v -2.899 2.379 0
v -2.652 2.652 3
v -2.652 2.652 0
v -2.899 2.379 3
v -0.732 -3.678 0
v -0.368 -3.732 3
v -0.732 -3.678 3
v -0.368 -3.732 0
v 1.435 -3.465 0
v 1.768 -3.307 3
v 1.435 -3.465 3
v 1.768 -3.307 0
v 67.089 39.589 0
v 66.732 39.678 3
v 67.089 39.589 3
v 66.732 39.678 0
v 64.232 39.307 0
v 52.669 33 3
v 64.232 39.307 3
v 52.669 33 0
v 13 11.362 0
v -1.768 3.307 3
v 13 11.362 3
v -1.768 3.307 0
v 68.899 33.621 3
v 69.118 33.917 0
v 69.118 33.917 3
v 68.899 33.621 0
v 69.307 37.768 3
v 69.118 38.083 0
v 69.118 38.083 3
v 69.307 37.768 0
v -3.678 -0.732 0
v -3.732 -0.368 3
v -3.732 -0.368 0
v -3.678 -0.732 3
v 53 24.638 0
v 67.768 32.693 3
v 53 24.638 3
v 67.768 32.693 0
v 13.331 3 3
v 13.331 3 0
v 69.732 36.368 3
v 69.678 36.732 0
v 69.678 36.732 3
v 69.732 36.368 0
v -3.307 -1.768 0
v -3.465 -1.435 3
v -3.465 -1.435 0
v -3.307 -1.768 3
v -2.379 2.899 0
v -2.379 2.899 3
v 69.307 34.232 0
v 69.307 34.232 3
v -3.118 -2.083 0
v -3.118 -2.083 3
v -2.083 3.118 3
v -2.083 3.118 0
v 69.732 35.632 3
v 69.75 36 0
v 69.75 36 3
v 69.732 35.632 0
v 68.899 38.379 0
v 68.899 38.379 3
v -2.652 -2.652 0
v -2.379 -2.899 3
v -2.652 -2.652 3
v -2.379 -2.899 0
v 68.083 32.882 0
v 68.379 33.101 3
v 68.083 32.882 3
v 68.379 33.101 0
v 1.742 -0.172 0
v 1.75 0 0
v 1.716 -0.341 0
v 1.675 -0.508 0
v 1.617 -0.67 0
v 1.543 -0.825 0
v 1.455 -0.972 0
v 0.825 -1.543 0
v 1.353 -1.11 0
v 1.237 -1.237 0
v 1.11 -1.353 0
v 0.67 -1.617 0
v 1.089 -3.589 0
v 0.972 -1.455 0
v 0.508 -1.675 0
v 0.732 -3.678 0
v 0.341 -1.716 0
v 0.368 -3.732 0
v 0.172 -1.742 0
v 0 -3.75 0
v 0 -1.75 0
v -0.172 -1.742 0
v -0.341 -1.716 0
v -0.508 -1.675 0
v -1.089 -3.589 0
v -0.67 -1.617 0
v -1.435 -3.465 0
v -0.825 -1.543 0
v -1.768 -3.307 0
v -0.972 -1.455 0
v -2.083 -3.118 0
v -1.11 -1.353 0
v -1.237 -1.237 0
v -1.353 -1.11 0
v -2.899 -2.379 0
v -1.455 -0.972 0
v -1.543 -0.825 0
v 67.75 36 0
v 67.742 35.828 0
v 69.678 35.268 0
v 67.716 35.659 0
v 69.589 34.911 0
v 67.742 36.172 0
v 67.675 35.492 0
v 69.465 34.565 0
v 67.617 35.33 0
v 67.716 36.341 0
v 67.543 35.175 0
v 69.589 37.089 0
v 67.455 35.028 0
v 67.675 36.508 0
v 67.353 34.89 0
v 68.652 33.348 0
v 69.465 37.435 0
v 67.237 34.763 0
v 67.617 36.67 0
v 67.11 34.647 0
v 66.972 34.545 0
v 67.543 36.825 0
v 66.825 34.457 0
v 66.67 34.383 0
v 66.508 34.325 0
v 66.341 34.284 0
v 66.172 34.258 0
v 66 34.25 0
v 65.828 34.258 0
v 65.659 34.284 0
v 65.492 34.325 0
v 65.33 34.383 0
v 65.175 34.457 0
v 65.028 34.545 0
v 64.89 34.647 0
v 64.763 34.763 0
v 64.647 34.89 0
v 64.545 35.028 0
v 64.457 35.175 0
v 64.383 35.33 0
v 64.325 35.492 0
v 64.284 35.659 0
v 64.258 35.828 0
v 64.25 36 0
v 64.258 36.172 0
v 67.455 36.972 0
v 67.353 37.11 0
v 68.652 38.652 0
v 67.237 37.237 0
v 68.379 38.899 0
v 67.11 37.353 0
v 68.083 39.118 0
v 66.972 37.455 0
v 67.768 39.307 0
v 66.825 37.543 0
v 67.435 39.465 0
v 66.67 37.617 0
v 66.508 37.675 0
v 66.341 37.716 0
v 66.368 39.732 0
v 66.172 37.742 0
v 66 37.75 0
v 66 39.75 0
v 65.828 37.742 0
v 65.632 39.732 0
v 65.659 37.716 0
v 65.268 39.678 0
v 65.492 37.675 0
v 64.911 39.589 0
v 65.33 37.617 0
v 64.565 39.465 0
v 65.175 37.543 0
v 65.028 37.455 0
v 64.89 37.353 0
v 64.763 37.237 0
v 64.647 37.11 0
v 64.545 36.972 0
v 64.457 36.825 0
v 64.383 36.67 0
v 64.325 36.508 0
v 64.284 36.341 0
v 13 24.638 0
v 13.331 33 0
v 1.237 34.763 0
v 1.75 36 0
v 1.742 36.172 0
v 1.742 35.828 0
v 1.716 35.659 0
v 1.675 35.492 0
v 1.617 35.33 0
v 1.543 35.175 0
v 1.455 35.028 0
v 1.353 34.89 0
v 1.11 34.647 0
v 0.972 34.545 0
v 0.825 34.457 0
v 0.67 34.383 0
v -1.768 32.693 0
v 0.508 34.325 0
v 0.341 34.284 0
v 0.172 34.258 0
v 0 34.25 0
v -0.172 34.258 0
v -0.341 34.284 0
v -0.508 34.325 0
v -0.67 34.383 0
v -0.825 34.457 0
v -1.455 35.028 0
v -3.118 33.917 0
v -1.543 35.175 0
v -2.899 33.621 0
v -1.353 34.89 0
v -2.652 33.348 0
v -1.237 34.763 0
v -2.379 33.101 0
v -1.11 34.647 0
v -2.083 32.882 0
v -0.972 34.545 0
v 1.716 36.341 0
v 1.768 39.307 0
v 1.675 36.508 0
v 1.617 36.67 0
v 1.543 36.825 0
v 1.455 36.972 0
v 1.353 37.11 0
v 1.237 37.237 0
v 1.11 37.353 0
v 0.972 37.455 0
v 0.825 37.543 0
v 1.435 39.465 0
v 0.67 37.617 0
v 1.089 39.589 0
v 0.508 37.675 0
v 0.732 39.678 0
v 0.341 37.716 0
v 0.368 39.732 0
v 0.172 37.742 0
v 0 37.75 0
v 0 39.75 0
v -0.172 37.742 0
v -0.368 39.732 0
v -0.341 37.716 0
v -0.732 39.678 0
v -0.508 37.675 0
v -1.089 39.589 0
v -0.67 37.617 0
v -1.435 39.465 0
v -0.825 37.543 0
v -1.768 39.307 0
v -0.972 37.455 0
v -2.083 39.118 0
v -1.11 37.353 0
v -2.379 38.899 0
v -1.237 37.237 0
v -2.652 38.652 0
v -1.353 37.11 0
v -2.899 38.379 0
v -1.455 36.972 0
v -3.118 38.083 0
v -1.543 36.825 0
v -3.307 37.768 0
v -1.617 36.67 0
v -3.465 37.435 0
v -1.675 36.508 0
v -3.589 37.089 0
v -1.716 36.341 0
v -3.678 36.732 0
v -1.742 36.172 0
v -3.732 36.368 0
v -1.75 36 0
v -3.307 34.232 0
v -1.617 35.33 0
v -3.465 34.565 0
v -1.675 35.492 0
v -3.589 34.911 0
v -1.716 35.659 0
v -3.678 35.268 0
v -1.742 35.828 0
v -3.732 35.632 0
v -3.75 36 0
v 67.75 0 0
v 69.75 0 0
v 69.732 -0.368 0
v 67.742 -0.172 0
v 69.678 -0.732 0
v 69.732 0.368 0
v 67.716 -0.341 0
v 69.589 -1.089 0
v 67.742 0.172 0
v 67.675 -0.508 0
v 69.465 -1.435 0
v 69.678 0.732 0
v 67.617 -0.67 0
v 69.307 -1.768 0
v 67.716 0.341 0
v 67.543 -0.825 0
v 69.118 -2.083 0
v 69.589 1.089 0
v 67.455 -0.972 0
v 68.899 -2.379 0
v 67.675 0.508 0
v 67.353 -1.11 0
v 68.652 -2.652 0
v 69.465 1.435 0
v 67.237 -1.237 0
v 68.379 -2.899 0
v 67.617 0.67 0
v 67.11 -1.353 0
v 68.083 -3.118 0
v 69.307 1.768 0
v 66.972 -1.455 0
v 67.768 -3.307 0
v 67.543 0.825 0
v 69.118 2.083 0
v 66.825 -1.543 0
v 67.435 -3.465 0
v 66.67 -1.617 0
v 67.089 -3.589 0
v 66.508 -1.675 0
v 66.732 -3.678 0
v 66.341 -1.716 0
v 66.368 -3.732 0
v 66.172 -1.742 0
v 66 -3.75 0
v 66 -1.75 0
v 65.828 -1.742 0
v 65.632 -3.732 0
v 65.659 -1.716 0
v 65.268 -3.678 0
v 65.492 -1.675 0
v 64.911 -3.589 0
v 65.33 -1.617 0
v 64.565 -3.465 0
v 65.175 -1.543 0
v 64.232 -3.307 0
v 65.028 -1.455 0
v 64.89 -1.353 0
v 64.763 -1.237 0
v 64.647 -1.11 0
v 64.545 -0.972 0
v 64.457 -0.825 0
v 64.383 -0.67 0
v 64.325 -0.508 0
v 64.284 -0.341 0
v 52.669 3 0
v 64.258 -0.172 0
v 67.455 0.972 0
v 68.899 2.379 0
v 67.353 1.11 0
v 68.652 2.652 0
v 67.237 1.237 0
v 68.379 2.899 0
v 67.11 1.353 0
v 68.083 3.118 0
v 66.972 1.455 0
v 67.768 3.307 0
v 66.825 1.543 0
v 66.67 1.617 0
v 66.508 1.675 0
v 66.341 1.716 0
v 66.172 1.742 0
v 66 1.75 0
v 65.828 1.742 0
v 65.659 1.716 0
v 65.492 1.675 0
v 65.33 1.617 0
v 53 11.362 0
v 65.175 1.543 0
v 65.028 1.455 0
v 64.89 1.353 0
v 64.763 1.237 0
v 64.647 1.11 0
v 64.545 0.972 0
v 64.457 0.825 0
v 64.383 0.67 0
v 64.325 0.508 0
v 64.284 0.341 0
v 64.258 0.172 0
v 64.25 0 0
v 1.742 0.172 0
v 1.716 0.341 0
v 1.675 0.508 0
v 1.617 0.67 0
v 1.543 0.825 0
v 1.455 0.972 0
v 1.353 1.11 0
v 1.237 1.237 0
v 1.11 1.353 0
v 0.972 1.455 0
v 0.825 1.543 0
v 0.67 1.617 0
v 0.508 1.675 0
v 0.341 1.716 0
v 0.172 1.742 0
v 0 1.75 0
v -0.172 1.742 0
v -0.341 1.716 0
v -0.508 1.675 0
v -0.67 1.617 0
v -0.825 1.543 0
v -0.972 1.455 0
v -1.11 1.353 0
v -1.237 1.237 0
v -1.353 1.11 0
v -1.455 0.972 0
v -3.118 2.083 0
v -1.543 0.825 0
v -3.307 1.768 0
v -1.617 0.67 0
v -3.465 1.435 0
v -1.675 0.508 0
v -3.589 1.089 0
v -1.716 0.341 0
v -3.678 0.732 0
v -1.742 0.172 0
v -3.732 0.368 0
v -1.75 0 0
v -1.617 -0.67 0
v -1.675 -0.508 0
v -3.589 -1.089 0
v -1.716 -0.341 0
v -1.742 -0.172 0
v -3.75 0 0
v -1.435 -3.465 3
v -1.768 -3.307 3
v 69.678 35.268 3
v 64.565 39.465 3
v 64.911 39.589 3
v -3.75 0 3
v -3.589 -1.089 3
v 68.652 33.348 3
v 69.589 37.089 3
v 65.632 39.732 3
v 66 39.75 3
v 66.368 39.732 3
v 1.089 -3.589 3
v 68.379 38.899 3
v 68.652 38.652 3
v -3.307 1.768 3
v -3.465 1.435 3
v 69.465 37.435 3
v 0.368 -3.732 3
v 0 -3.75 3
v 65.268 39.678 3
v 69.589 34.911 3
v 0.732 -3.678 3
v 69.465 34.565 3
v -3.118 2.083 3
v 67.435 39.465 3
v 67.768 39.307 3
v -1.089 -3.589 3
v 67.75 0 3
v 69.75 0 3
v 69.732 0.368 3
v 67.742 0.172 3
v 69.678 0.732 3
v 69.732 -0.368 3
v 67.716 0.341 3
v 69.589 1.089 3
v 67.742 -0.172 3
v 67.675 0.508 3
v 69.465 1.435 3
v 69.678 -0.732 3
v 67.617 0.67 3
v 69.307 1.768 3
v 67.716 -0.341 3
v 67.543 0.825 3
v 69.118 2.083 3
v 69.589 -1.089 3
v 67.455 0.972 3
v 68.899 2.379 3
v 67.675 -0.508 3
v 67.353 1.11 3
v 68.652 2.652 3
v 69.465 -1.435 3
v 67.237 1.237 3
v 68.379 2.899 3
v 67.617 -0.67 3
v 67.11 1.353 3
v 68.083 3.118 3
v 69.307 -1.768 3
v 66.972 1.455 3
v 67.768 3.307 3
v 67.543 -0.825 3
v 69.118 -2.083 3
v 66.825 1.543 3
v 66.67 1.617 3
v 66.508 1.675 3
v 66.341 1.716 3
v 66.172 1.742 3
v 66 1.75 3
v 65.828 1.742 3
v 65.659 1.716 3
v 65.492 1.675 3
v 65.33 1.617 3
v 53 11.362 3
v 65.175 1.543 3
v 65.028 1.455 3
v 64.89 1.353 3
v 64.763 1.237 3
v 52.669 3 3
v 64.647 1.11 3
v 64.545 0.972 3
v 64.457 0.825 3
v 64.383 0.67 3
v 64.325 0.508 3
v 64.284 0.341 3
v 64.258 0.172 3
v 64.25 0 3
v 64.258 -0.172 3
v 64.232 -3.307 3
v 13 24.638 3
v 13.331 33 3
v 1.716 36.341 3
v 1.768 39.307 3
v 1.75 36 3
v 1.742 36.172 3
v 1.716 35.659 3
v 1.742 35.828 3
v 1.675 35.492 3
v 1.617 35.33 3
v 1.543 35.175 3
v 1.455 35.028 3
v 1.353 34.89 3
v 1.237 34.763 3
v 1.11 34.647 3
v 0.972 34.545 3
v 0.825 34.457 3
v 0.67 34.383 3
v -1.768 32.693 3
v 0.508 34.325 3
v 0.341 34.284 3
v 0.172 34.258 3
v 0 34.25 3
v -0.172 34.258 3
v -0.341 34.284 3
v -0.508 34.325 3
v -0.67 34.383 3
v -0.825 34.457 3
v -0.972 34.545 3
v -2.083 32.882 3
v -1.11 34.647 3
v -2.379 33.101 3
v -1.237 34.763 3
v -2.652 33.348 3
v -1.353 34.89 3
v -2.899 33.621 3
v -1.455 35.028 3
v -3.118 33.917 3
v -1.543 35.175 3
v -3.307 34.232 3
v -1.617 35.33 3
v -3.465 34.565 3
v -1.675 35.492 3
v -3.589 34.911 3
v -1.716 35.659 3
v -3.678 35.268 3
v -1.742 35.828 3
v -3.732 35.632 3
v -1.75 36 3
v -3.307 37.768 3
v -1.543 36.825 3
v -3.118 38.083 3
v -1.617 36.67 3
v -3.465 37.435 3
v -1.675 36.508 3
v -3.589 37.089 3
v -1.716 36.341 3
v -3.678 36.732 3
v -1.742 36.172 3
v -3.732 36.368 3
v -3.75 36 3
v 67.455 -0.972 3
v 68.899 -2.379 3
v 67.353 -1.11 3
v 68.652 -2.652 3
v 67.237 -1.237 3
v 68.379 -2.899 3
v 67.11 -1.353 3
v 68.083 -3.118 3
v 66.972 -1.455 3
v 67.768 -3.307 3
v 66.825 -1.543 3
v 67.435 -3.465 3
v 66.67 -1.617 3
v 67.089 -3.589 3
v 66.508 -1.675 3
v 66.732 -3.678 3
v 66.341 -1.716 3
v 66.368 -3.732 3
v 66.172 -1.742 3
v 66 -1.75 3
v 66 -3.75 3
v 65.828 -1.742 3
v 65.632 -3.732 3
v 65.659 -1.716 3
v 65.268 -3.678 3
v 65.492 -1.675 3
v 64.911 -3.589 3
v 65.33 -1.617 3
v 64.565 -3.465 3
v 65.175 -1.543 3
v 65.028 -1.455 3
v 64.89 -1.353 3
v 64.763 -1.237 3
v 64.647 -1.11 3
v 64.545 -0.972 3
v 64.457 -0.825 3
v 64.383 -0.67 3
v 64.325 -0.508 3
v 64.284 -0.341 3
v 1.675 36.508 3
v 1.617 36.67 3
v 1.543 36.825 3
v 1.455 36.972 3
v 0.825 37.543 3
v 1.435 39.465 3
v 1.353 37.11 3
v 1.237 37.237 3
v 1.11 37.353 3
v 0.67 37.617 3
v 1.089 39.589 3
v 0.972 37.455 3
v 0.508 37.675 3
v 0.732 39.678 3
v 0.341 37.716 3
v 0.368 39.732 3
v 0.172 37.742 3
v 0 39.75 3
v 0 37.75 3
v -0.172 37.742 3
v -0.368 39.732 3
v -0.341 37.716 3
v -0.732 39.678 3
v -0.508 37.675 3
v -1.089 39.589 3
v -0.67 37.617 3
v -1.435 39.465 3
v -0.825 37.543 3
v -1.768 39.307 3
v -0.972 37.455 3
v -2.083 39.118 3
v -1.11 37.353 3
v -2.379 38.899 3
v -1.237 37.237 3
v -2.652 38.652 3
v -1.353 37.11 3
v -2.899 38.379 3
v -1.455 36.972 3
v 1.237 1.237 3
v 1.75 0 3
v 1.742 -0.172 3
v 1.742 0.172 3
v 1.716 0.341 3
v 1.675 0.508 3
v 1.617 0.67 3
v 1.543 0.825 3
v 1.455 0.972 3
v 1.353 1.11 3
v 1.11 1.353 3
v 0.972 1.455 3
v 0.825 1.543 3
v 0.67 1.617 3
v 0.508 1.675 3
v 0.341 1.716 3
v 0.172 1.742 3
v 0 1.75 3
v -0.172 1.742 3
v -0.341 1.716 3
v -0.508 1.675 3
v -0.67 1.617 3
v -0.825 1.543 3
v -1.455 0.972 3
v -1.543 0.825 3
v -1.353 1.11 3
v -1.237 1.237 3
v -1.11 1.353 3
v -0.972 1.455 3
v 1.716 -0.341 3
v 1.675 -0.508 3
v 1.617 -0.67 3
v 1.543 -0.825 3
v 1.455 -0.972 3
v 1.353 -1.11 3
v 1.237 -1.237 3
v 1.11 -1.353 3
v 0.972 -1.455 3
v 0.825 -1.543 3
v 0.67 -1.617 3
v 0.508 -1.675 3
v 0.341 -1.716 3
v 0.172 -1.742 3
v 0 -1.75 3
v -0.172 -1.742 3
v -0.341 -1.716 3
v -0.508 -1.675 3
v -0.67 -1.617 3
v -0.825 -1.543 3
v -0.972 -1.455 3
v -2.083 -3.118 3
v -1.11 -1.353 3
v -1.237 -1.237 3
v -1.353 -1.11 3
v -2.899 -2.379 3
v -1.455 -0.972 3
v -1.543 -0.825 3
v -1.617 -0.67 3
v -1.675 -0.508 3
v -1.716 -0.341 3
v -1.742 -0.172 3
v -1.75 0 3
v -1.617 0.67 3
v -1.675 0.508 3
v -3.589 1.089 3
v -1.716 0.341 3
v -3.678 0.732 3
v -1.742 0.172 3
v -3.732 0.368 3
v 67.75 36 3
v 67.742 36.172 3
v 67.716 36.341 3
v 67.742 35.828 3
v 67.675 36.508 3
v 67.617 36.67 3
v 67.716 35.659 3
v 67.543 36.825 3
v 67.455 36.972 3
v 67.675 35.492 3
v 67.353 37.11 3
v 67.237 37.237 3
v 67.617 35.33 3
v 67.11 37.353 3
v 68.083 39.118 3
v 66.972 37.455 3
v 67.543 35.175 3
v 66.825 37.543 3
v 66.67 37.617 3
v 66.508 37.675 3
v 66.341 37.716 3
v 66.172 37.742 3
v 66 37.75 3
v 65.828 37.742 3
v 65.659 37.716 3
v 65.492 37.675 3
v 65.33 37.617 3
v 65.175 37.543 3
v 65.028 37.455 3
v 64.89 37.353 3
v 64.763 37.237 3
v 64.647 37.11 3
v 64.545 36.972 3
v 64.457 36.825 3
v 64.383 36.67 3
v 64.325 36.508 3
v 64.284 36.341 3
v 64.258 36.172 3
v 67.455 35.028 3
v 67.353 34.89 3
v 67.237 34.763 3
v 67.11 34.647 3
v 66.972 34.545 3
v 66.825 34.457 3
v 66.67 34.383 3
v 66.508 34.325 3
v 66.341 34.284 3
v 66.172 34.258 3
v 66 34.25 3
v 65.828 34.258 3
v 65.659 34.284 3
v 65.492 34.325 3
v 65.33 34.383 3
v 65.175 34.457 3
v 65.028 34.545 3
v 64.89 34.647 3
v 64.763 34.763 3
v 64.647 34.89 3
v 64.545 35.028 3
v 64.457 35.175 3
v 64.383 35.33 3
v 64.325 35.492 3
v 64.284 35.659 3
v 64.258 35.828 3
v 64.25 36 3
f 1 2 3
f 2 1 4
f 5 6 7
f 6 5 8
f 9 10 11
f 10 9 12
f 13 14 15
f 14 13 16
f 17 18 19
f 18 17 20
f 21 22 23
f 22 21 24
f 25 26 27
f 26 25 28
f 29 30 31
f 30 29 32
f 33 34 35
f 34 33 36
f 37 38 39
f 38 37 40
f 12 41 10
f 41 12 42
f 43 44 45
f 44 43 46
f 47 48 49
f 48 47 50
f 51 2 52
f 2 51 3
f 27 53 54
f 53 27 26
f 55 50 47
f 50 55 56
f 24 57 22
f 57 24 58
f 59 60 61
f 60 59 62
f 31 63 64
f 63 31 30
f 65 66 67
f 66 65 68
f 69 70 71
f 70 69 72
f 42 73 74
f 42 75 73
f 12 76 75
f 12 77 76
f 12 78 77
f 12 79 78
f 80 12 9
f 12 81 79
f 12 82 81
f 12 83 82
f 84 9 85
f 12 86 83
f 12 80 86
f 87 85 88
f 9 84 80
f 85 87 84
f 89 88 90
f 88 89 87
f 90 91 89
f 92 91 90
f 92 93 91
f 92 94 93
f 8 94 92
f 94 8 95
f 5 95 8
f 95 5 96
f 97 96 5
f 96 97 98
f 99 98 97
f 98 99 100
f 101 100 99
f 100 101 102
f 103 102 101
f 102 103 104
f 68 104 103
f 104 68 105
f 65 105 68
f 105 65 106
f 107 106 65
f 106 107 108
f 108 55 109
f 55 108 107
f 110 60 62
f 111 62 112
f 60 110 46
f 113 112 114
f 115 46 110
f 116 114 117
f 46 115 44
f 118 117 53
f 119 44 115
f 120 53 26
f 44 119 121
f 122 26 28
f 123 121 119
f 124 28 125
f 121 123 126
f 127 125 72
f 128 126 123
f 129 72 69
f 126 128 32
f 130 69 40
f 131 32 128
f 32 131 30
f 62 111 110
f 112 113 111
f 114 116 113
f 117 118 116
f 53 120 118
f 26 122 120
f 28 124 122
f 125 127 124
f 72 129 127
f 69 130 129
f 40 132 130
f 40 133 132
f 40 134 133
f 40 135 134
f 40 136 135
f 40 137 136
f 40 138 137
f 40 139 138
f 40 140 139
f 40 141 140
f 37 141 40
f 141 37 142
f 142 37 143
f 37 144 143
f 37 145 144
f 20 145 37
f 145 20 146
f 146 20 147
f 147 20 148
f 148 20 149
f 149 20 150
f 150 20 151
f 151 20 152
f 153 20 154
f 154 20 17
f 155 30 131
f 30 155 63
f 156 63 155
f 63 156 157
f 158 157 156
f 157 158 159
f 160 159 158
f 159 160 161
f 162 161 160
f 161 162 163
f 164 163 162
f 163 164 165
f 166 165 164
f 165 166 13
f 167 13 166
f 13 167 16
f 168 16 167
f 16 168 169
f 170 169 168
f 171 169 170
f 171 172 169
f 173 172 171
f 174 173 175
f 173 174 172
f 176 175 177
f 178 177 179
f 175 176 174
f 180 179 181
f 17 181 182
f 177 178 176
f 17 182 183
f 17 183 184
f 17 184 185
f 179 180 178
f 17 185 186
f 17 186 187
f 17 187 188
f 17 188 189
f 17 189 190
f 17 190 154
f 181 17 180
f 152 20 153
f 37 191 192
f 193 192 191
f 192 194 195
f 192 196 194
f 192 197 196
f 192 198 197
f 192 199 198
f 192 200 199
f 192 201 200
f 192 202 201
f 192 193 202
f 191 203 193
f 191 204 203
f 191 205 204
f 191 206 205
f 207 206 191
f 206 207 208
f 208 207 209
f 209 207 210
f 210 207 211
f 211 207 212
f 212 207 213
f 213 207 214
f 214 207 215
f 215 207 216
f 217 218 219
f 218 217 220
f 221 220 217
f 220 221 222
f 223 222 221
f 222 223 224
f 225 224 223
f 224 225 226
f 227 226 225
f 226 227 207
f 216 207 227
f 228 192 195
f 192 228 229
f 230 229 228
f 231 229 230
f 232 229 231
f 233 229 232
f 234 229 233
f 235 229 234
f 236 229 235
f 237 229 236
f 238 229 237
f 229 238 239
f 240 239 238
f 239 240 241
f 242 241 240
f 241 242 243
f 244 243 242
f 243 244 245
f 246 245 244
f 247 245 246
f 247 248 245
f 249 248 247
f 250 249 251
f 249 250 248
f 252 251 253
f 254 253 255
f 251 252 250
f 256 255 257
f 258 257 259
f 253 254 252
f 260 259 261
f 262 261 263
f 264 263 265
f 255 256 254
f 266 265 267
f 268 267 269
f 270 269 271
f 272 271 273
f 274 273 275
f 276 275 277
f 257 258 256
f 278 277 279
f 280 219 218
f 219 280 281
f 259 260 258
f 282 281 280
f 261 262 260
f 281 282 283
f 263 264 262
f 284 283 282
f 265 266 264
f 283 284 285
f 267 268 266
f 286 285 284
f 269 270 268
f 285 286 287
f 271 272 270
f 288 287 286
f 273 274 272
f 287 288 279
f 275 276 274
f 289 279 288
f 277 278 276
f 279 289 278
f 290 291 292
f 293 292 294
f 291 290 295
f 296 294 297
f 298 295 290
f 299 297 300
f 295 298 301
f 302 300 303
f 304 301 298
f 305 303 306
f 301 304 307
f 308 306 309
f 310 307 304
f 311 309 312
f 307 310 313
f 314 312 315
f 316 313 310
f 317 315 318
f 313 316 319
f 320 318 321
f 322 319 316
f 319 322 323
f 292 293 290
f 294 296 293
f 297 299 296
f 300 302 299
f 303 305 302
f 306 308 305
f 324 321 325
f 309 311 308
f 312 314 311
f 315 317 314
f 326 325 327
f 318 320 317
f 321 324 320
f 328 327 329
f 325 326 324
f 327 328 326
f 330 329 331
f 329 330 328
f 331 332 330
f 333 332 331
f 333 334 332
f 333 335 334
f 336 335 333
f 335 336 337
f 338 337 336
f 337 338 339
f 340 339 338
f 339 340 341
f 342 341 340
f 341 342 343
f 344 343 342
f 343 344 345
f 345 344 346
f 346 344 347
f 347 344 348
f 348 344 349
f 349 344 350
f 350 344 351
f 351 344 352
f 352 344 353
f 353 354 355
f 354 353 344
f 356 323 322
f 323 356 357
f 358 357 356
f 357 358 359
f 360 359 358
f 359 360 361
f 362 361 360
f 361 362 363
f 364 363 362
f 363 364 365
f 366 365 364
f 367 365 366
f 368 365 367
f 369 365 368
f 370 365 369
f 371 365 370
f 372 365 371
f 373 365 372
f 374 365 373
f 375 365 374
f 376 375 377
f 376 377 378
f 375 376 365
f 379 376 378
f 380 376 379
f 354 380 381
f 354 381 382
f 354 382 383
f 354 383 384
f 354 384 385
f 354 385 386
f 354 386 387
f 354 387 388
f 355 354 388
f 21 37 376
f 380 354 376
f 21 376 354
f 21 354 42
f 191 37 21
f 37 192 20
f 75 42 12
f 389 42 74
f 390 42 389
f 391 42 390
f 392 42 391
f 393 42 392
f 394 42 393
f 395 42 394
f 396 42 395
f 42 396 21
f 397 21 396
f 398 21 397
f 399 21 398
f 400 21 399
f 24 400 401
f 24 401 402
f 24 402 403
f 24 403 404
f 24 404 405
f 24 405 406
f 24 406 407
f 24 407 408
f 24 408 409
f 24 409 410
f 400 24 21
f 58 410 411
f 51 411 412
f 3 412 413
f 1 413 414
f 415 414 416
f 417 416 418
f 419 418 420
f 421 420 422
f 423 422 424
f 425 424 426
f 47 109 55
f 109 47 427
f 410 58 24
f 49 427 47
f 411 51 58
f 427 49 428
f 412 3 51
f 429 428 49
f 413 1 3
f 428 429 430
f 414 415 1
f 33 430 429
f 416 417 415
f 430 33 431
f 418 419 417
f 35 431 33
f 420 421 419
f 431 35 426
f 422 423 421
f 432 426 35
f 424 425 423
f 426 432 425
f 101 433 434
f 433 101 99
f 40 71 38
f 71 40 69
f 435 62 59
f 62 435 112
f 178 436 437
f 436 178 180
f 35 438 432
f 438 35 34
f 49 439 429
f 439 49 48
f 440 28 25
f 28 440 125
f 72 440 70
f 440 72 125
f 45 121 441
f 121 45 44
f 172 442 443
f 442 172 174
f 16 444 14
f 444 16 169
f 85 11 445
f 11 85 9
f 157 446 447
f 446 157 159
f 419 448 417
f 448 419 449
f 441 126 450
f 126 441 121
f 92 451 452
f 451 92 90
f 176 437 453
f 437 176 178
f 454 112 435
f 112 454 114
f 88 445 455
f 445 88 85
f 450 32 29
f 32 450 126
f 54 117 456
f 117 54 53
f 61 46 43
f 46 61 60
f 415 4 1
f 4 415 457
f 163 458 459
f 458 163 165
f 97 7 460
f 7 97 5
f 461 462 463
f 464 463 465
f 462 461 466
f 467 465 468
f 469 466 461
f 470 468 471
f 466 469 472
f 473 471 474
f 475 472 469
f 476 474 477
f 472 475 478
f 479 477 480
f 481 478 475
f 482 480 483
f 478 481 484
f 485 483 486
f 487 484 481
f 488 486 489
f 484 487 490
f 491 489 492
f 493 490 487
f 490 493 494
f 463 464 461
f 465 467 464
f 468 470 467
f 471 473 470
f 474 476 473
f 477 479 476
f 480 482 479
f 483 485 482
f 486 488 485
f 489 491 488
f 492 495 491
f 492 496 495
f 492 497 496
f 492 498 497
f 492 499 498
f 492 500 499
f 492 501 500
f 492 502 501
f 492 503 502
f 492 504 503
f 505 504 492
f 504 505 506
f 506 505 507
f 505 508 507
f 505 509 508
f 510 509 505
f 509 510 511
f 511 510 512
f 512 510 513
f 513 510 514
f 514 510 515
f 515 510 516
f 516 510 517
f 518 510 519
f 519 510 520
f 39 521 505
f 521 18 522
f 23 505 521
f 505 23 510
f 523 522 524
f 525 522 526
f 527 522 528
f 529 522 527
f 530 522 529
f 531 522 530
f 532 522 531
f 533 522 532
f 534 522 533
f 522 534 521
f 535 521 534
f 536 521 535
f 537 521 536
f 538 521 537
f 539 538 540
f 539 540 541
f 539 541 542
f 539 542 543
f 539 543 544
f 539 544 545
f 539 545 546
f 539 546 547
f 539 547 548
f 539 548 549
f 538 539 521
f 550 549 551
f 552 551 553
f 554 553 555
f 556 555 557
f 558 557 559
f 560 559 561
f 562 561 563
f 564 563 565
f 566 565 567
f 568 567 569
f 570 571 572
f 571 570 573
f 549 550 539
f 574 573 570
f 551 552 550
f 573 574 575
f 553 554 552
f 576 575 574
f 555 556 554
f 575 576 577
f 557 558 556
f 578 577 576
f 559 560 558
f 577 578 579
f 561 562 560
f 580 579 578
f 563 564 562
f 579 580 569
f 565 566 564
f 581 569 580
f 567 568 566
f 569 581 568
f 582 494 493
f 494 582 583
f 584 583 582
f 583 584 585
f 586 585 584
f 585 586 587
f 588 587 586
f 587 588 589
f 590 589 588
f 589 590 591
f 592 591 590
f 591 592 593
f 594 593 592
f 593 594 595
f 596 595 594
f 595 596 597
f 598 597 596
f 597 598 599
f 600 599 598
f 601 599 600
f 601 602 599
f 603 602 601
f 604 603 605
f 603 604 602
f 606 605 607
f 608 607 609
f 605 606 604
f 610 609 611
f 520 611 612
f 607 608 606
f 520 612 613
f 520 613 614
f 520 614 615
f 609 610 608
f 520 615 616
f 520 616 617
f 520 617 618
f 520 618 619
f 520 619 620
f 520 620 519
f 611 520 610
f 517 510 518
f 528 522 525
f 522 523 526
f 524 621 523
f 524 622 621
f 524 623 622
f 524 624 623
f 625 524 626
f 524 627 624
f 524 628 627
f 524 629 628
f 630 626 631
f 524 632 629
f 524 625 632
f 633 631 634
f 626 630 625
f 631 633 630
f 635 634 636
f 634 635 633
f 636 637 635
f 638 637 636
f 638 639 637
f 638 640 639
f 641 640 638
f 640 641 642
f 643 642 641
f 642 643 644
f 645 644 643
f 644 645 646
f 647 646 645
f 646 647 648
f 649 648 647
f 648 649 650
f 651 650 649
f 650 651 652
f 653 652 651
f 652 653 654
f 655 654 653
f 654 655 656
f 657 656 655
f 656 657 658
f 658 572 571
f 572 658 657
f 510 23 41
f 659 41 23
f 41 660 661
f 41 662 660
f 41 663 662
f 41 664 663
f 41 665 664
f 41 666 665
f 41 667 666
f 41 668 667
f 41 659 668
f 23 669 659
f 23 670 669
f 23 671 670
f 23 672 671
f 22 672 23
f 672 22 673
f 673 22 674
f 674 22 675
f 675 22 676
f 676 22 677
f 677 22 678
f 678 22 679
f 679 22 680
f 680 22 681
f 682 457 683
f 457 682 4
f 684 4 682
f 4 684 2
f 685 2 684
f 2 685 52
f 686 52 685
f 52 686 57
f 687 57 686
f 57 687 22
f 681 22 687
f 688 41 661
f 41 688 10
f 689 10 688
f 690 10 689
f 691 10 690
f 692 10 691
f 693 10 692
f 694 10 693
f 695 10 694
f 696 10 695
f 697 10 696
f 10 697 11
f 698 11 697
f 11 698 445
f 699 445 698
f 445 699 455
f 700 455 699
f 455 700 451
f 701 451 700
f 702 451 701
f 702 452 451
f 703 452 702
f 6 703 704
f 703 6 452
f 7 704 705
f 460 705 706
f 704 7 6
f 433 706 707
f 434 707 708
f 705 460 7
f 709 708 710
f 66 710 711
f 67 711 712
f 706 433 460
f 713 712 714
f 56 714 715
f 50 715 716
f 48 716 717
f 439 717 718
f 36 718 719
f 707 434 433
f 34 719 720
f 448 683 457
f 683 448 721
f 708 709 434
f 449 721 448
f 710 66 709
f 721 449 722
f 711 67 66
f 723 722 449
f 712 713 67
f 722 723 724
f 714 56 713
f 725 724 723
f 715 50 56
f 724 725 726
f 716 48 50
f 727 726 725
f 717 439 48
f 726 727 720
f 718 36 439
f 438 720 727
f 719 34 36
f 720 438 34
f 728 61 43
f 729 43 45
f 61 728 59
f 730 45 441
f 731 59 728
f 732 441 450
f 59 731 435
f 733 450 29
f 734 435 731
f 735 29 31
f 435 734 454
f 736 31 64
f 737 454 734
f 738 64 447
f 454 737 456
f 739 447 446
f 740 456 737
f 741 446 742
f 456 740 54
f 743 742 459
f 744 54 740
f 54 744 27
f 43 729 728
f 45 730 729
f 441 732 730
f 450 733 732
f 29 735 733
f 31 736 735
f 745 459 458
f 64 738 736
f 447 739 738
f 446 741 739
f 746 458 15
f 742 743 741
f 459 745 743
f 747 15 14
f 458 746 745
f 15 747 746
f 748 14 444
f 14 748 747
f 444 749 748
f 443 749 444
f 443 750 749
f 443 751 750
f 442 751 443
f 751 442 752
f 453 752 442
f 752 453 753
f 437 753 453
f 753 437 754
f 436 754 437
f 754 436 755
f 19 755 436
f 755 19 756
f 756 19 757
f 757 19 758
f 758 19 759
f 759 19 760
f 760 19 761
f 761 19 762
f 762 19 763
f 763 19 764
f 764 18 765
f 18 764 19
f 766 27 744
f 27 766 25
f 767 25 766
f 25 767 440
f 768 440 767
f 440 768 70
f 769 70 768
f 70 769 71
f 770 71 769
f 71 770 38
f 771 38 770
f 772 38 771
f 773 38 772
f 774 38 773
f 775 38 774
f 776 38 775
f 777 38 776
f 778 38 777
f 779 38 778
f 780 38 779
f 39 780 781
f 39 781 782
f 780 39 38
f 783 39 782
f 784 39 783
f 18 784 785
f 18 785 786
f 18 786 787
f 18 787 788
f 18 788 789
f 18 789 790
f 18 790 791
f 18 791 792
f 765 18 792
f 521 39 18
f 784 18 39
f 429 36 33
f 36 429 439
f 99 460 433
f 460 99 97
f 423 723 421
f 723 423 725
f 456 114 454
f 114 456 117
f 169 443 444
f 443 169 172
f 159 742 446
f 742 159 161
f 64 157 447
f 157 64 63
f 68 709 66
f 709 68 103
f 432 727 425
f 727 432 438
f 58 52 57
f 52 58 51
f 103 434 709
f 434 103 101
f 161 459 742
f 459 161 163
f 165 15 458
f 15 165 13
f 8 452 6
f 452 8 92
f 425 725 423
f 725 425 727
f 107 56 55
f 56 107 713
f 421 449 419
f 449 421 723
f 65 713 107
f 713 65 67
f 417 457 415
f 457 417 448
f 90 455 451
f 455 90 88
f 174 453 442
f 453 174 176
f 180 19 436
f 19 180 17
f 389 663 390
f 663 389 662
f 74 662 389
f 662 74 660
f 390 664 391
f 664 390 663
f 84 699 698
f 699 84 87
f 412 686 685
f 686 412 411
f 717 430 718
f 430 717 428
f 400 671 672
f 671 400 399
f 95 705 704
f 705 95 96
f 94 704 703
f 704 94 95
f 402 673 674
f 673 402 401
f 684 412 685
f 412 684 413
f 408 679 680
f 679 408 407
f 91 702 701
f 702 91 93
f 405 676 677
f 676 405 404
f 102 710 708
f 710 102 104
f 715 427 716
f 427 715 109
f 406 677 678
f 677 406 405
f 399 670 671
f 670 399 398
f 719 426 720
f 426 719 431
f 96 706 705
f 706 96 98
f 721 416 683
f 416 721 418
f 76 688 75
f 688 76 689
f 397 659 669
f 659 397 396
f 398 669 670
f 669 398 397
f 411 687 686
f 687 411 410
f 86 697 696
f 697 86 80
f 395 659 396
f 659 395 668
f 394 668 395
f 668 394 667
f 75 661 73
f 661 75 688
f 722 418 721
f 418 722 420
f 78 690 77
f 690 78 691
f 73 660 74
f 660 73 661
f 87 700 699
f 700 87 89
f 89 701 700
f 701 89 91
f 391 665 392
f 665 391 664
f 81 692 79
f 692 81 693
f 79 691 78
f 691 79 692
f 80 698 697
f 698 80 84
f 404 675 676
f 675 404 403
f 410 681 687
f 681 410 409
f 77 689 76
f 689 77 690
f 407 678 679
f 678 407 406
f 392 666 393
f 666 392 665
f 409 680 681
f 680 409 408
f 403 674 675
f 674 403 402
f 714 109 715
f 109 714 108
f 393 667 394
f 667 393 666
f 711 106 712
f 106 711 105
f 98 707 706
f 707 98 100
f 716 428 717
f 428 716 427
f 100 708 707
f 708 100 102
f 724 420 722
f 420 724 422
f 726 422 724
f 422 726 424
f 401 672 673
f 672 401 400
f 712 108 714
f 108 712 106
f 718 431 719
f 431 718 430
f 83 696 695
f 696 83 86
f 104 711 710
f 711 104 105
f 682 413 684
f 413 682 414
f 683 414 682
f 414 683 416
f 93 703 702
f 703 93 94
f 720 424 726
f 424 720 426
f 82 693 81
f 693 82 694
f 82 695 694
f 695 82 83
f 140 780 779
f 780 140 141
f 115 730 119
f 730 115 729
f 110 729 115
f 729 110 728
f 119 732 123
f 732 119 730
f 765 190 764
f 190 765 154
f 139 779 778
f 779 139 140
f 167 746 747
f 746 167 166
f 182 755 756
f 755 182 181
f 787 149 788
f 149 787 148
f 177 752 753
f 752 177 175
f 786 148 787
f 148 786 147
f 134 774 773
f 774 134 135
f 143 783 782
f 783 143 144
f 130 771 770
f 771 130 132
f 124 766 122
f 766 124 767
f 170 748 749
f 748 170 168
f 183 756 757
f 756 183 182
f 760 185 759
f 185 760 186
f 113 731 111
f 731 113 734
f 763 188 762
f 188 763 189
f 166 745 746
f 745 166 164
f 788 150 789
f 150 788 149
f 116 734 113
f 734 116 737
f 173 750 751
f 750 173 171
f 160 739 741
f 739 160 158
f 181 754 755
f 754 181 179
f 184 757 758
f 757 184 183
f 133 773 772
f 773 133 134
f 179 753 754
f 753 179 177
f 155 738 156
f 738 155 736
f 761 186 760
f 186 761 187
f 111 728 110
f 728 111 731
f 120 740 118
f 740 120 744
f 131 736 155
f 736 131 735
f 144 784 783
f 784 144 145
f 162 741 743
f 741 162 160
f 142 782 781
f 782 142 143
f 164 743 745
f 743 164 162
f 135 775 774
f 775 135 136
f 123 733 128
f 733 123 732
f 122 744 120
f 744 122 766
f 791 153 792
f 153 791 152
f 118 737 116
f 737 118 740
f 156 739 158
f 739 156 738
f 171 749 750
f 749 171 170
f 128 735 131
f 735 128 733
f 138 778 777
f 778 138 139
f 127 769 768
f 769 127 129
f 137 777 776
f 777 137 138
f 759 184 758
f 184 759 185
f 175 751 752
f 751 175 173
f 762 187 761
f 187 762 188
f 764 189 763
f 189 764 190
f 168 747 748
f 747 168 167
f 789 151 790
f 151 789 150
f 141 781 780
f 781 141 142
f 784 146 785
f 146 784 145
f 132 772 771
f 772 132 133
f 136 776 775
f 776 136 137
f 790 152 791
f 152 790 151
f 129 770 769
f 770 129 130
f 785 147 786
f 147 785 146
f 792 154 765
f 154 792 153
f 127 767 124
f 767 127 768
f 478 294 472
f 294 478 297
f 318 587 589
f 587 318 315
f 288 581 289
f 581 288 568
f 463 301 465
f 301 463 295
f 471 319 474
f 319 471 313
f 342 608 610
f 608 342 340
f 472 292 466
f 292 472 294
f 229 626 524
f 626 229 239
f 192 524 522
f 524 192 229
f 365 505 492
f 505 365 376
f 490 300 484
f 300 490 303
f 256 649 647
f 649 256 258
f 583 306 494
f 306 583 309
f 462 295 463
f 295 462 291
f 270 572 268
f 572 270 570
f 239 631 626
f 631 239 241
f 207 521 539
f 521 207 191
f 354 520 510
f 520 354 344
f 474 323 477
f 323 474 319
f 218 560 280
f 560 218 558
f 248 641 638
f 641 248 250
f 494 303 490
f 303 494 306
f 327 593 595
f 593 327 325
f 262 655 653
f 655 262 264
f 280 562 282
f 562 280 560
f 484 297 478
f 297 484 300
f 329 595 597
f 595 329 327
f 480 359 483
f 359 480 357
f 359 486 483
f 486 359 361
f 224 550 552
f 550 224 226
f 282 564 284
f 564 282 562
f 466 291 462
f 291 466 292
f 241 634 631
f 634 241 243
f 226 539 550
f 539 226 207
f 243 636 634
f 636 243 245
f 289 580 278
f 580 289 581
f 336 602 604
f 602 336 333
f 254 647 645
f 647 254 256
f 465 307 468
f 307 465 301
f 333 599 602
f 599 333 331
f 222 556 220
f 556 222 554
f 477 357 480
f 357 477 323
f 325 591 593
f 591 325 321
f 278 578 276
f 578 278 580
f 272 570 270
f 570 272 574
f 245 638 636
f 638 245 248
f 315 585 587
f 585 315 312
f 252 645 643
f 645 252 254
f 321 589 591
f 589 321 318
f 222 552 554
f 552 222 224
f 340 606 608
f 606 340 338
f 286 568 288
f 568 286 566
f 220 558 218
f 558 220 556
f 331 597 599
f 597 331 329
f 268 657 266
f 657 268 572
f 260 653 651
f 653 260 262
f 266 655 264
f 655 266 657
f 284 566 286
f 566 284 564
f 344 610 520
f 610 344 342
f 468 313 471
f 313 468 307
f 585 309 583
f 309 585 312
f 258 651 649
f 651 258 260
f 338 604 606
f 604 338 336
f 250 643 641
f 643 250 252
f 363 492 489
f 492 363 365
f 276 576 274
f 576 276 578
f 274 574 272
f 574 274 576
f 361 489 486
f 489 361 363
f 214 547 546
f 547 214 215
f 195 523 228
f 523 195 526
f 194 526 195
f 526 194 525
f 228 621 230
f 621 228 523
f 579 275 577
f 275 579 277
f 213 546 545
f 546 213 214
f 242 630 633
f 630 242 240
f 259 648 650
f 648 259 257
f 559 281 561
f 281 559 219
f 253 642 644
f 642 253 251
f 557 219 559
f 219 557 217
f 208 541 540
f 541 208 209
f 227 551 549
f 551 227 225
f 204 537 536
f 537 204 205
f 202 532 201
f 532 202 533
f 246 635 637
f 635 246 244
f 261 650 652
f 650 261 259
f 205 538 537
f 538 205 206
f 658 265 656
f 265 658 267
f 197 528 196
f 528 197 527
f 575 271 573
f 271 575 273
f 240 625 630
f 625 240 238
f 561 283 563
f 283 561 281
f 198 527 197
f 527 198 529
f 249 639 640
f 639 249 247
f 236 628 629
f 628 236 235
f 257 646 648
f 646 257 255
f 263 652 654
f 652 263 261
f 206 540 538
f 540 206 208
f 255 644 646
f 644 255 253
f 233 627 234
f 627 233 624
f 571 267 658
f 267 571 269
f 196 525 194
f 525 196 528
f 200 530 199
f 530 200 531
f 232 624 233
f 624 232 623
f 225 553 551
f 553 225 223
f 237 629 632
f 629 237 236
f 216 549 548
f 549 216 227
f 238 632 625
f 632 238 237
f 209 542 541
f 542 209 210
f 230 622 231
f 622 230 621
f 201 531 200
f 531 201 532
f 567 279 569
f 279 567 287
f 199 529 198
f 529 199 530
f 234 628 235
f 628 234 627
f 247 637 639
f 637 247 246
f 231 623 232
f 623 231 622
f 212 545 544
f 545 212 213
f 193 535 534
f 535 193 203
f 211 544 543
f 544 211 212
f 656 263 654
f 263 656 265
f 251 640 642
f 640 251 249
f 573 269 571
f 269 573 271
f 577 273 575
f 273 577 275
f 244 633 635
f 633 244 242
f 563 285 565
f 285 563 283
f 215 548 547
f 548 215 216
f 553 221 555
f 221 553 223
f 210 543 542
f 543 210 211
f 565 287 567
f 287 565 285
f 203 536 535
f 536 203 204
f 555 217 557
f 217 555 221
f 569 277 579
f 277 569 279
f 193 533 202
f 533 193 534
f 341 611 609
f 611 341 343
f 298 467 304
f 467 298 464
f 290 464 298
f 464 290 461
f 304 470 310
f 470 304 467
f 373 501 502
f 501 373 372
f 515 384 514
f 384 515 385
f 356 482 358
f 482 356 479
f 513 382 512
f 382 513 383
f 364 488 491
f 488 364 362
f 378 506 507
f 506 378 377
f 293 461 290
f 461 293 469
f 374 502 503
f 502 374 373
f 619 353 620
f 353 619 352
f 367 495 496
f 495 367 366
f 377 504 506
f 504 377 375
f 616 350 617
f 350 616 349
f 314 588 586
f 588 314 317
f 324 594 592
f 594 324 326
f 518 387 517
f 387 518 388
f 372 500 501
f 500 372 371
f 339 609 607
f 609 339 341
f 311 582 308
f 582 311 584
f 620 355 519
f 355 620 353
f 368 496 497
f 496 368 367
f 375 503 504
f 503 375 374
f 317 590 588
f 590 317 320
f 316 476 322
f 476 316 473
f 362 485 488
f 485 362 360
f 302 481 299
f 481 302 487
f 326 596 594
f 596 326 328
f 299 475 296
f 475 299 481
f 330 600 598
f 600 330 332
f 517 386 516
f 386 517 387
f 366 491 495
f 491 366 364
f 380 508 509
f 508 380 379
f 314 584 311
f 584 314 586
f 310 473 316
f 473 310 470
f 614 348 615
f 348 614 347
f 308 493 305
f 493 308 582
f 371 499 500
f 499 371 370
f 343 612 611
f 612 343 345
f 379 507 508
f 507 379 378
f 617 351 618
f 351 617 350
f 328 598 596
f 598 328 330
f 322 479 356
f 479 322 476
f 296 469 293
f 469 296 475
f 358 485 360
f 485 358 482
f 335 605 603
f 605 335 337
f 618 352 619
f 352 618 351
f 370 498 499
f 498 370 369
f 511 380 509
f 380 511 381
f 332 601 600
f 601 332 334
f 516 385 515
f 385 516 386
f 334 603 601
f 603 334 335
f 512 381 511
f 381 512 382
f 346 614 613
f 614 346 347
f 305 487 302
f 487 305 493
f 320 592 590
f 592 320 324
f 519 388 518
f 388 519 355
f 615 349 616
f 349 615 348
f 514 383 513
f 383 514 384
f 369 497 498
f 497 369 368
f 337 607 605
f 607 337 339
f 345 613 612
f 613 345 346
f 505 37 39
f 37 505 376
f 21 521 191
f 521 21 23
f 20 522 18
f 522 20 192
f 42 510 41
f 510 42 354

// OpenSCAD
// file: subpieces/bone.scad
        

module bone(length, width, thickness, _fn) {
    hull() {
        cylinder(h = thickness, r = width, center = false, $fn = _fn);
        translate([0, length, 0])
            cylinder(h = thickness, r = width, center = false, $fn = _fn);
    }
}


// demo bone
bone(
    length = 40,
    width = 6,
    thickness = 3,
    _fn = 128
);
// main file
use <./subpieces/bone.scad>


/**
 * bodyPieceA
 * @name bodyPieceA
 * @description Joins sections of body
 * @type piece
 * @parent bodyComponent
 */
module bodyPieceA(
    with_platform = true
) {

    fixations_position_lenth = 66;
    fixations_position_width = 36;

    branches_width = 7.5;

    platform_lenth = 40;
    platform_width = 30;
    platform_z_offset = 0;

    _fn = 64;
    thickness = 3;

    // Fixations holes configuration
    screw_hole_diameter = 3.5;

    union() {
        difference() {        
            hull() {
                translate([0, 0, 0])
                    cylinder(h = thickness, r = branches_width / 2, center = false, $fn = _fn);
                translate([fixations_position_lenth, fixations_position_width, 0])
                    cylinder(h = thickness, r = branches_width / 2, center = false, $fn = _fn);
            }

            // bone(length, width, thickness, _fn);

            translate([0, 0, 0])
                cylinder(h = thickness * 5, r = screw_hole_diameter / 2, center = true, $fn = _fn);

            translate([fixations_position_lenth, fixations_position_width, 0])
                cylinder(h = thickness * 5, r = screw_hole_diameter / 2, center = true, $fn = _fn);
        }

        difference() {        
            hull() {
                translate([0, fixations_position_width, 0])
                    cylinder(h = thickness, r = branches_width / 2, center = false, $fn = _fn);
                translate([fixations_position_lenth, 0, 0])
                    cylinder(h = thickness, r = branches_width / 2, center = false, $fn = _fn);
            }
            translate([0, fixations_position_width, 0])
                cylinder(h = thickness * 5, r = screw_hole_diameter / 2, center = true, $fn = _fn);

            translate([fixations_position_lenth, 0, 0])
                cylinder(h = thickness * 5, r = screw_hole_diameter / 2, center = true, $fn = _fn);
        }

        // Platfor for components
        if (with_platform)
            translate([
                fixations_position_lenth / 2,
                fixations_position_width / 2,
                thickness / 2 + platform_z_offset
                ])
                cube([platform_lenth, platform_width, thickness], center = true);

    }

}


/**
 * @stl
 * @png
 * @colorscheme BeforeDawn
 * @view axes,scales
 */
bodyPieceA();
